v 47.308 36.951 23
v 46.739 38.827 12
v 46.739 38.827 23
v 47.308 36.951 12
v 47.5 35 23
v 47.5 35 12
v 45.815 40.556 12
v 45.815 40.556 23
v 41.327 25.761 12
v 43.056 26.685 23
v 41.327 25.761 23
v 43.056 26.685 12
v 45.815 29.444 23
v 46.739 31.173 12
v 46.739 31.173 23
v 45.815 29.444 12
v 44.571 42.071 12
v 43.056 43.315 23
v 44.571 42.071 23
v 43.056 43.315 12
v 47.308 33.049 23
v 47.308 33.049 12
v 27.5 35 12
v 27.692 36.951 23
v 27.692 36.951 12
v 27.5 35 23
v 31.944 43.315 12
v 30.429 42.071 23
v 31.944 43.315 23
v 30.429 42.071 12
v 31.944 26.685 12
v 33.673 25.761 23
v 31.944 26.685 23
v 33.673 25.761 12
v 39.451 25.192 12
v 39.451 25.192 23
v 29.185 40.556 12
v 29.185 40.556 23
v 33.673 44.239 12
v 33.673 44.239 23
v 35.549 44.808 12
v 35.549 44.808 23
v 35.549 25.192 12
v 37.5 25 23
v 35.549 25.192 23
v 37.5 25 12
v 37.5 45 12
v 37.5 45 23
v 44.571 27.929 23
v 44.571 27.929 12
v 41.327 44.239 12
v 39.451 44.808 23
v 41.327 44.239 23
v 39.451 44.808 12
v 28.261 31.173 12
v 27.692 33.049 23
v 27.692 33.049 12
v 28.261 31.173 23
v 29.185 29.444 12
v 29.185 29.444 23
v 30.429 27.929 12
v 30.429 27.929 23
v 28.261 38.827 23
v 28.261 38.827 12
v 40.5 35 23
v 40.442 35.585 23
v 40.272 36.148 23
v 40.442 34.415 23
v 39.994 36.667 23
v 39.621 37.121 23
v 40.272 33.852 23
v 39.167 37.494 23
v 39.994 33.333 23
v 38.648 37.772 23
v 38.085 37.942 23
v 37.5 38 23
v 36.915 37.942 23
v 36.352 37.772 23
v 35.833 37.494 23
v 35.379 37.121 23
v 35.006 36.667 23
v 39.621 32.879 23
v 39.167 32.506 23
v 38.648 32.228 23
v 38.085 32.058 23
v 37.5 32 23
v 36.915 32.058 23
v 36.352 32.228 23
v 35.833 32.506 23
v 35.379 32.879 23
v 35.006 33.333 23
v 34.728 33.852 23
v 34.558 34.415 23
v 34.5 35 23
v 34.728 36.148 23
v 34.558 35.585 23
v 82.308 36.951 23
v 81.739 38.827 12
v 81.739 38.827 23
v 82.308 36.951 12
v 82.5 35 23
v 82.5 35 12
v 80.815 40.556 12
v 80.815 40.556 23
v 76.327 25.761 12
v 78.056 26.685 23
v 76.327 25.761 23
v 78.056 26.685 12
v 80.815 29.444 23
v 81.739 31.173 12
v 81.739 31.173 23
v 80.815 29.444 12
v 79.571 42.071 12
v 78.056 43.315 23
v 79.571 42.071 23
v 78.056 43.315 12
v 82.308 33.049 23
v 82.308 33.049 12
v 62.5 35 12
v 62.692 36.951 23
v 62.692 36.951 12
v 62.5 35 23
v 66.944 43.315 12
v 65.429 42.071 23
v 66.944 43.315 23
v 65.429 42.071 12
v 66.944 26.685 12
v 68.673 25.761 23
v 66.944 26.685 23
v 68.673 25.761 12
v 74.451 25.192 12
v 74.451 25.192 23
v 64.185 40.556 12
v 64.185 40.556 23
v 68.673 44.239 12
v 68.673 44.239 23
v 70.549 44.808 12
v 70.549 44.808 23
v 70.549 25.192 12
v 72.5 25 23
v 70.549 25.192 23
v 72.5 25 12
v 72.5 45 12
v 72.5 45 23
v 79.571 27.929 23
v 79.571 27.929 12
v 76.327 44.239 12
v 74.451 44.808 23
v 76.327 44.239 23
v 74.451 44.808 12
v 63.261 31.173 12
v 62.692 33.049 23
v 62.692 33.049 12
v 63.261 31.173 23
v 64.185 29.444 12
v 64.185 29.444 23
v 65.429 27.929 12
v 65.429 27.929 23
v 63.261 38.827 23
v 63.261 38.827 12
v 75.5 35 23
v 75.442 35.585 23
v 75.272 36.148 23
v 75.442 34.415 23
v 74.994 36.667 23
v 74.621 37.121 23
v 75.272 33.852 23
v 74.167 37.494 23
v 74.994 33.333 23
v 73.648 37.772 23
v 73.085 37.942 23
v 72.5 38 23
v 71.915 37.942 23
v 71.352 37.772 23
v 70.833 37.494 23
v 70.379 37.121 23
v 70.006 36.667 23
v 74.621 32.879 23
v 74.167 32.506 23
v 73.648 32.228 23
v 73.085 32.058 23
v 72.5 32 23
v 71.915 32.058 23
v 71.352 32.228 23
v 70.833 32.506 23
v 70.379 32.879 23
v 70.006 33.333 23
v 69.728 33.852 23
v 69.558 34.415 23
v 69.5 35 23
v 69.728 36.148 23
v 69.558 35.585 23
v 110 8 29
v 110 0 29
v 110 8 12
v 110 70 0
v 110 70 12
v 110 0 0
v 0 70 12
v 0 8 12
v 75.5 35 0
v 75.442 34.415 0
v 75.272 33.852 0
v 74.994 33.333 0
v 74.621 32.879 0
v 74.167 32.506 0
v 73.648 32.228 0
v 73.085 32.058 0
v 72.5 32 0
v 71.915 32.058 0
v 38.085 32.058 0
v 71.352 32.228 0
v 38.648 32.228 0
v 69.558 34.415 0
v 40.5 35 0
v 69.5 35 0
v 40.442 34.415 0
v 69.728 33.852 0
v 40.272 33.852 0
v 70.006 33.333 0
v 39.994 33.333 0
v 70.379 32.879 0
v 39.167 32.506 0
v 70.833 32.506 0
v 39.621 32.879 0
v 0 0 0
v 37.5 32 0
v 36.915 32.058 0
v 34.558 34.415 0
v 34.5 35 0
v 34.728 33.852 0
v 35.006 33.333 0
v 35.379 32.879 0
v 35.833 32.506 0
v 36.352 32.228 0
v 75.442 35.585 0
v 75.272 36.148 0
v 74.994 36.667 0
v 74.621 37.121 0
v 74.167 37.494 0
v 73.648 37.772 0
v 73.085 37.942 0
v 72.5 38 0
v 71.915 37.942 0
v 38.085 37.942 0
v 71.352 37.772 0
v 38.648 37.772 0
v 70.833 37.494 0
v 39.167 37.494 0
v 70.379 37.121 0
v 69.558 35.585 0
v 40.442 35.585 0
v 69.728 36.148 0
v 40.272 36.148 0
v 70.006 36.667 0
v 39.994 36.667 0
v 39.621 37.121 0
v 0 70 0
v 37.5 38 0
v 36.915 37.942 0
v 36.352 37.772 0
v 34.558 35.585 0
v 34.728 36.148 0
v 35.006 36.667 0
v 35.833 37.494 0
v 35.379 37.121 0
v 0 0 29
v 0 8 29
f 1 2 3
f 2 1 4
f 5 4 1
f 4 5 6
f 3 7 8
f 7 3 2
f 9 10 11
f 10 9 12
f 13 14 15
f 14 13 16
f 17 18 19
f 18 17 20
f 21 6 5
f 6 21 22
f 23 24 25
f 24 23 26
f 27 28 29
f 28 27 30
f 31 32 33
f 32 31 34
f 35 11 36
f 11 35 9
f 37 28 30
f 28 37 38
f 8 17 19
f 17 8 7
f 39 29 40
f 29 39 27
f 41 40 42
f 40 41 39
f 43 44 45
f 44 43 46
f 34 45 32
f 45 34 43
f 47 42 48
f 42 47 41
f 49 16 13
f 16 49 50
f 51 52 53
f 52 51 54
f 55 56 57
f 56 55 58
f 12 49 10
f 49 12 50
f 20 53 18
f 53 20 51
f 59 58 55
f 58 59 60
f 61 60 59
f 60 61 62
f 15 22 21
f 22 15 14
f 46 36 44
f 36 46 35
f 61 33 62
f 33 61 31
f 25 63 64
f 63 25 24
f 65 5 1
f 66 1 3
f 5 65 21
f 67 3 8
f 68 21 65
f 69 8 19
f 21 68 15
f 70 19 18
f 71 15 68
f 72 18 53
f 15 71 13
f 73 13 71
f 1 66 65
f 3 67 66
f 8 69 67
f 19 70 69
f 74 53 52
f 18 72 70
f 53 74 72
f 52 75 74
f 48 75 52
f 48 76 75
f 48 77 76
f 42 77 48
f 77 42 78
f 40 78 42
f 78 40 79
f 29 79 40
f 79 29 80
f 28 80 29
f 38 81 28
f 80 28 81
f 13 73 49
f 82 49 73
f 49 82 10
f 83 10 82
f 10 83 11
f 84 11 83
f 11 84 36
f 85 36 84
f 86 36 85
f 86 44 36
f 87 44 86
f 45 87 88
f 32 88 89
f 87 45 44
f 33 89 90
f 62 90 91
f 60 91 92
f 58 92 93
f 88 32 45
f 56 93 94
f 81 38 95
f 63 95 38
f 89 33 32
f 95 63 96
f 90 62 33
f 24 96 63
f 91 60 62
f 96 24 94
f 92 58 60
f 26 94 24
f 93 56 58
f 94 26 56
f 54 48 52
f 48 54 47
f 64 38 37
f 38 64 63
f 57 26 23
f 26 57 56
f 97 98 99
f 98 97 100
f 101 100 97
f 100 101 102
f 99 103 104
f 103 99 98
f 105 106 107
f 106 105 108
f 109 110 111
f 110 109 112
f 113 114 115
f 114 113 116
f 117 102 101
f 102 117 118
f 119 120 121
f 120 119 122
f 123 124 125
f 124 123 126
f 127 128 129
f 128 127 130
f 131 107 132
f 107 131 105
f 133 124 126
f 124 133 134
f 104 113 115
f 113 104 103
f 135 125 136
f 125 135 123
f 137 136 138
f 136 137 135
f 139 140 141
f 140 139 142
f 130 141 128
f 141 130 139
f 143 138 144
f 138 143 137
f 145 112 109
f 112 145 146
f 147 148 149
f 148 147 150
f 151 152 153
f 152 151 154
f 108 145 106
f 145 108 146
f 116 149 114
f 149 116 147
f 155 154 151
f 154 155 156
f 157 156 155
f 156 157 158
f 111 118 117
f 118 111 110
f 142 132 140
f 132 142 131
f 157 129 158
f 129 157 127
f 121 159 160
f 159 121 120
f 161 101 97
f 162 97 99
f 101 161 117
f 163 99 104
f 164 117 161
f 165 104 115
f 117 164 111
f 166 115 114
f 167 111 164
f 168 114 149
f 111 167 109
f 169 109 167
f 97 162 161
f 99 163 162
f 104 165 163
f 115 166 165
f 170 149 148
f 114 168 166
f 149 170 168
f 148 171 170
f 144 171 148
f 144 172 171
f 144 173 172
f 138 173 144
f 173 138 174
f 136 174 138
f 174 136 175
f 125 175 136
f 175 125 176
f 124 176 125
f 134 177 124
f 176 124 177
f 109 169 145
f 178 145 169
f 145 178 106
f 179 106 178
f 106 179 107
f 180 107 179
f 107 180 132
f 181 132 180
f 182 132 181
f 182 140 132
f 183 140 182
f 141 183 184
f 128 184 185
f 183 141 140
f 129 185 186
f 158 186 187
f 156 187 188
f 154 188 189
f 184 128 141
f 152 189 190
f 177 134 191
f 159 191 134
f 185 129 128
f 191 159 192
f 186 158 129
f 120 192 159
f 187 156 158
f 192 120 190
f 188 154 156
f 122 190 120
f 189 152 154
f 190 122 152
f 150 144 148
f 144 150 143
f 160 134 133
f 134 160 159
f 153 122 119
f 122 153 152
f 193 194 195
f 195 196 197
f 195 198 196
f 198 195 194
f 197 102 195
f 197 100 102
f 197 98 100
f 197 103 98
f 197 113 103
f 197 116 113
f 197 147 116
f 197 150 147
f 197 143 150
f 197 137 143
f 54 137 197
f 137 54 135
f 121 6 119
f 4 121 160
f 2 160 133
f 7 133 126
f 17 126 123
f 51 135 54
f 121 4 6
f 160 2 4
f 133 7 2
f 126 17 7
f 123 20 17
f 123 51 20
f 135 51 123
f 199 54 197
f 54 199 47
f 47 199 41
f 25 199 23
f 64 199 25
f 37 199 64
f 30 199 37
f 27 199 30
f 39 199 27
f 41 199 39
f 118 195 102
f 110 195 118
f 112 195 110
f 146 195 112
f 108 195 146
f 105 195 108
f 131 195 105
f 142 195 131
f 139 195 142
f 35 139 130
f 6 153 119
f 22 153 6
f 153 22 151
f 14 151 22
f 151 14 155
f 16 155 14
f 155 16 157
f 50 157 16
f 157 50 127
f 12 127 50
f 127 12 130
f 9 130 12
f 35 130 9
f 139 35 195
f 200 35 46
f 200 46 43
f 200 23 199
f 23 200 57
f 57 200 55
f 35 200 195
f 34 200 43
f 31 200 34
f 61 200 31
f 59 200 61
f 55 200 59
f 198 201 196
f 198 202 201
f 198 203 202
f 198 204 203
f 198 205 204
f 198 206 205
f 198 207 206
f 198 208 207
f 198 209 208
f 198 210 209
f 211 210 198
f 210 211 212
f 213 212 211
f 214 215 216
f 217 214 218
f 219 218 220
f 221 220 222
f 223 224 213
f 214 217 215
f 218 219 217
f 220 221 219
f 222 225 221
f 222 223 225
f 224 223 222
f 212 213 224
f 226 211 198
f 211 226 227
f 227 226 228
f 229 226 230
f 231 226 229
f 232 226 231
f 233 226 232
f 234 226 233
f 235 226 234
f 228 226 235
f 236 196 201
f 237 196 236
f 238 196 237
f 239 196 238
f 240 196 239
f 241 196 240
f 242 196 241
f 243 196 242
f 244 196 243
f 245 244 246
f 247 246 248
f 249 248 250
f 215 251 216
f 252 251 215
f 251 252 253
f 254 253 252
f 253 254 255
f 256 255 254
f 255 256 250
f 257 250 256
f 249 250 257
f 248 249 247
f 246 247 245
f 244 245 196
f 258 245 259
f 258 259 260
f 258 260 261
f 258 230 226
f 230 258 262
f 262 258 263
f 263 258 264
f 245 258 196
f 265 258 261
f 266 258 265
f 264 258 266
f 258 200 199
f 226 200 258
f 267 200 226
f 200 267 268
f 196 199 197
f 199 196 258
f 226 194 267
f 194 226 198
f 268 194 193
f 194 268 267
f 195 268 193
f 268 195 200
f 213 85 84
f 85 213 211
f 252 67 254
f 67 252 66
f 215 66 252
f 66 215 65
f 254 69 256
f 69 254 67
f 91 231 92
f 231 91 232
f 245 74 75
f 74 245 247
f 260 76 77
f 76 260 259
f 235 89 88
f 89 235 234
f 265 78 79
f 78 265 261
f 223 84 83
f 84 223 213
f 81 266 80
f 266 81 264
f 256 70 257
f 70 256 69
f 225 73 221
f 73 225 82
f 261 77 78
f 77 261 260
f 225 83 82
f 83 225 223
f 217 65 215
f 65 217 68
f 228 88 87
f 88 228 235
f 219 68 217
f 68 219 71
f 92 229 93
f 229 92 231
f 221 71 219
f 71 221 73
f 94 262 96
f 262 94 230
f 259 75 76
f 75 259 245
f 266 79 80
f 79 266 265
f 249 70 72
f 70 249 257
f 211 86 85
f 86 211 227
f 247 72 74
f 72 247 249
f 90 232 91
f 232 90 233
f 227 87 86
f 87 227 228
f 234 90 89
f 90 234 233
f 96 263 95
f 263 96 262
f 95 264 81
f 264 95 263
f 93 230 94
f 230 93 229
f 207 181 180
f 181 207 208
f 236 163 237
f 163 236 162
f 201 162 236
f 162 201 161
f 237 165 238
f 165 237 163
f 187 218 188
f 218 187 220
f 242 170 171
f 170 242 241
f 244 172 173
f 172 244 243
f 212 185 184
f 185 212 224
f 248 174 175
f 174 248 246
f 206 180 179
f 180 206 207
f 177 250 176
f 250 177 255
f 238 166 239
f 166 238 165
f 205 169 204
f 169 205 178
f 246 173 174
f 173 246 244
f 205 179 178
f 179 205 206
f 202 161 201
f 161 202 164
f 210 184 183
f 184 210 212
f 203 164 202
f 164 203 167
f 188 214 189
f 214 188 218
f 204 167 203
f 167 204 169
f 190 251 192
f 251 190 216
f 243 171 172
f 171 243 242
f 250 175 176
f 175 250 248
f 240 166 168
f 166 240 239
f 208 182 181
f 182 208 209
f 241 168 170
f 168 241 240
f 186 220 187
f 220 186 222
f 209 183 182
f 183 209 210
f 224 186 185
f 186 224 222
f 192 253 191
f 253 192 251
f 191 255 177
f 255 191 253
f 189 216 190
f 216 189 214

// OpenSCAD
$fn = 32;

// ----------------------------------------------------------------------
// Drill jig: fence jig
// ----------------------------------------------------------------------

// --- parameters (mm) ---
plate_l = 110;            // plate length, X
plate_w = 70;             // plate width, Y
plate_t = 12;             // plate thickness
boss_d = 20;              // guide boss diameter
boss_h = 12;              // boss height above the plate
guide_d = 6;              // guide hole diameter
boss_pitch = 35;          // boss pitch
fence_h = 18;             // fence height above the plate
fence_t = 8;              // fence thickness

n_boss = 2;  // guide bosses
boss_x0 = (plate_l - (n_boss - 1) * boss_pitch) / 2;  // first boss X
boss_top = plate_t - 1 + boss_h;  // boss crown height
fence_top = plate_t - 1 + fence_h;  // fence crown height
total_h = max([fence_top, boss_top]);  // overall height

difference() {
  union() {
  cube([plate_l, plate_w, plate_t]);
  for (i = [0 : n_boss - 1])
    translate([boss_x0 + i * boss_pitch, plate_w / 2, plate_t - 1])
      cylinder(h = boss_h, d = boss_d);
  translate([0, 0, plate_t - 1]) cube([plate_l, fence_t, fence_h]);
  }
  for (i = [0 : n_boss - 1])
    translate([boss_x0 + i * boss_pitch, plate_w / 2, -1])
      cylinder(h = plate_t + boss_h, d = guide_d);
}
